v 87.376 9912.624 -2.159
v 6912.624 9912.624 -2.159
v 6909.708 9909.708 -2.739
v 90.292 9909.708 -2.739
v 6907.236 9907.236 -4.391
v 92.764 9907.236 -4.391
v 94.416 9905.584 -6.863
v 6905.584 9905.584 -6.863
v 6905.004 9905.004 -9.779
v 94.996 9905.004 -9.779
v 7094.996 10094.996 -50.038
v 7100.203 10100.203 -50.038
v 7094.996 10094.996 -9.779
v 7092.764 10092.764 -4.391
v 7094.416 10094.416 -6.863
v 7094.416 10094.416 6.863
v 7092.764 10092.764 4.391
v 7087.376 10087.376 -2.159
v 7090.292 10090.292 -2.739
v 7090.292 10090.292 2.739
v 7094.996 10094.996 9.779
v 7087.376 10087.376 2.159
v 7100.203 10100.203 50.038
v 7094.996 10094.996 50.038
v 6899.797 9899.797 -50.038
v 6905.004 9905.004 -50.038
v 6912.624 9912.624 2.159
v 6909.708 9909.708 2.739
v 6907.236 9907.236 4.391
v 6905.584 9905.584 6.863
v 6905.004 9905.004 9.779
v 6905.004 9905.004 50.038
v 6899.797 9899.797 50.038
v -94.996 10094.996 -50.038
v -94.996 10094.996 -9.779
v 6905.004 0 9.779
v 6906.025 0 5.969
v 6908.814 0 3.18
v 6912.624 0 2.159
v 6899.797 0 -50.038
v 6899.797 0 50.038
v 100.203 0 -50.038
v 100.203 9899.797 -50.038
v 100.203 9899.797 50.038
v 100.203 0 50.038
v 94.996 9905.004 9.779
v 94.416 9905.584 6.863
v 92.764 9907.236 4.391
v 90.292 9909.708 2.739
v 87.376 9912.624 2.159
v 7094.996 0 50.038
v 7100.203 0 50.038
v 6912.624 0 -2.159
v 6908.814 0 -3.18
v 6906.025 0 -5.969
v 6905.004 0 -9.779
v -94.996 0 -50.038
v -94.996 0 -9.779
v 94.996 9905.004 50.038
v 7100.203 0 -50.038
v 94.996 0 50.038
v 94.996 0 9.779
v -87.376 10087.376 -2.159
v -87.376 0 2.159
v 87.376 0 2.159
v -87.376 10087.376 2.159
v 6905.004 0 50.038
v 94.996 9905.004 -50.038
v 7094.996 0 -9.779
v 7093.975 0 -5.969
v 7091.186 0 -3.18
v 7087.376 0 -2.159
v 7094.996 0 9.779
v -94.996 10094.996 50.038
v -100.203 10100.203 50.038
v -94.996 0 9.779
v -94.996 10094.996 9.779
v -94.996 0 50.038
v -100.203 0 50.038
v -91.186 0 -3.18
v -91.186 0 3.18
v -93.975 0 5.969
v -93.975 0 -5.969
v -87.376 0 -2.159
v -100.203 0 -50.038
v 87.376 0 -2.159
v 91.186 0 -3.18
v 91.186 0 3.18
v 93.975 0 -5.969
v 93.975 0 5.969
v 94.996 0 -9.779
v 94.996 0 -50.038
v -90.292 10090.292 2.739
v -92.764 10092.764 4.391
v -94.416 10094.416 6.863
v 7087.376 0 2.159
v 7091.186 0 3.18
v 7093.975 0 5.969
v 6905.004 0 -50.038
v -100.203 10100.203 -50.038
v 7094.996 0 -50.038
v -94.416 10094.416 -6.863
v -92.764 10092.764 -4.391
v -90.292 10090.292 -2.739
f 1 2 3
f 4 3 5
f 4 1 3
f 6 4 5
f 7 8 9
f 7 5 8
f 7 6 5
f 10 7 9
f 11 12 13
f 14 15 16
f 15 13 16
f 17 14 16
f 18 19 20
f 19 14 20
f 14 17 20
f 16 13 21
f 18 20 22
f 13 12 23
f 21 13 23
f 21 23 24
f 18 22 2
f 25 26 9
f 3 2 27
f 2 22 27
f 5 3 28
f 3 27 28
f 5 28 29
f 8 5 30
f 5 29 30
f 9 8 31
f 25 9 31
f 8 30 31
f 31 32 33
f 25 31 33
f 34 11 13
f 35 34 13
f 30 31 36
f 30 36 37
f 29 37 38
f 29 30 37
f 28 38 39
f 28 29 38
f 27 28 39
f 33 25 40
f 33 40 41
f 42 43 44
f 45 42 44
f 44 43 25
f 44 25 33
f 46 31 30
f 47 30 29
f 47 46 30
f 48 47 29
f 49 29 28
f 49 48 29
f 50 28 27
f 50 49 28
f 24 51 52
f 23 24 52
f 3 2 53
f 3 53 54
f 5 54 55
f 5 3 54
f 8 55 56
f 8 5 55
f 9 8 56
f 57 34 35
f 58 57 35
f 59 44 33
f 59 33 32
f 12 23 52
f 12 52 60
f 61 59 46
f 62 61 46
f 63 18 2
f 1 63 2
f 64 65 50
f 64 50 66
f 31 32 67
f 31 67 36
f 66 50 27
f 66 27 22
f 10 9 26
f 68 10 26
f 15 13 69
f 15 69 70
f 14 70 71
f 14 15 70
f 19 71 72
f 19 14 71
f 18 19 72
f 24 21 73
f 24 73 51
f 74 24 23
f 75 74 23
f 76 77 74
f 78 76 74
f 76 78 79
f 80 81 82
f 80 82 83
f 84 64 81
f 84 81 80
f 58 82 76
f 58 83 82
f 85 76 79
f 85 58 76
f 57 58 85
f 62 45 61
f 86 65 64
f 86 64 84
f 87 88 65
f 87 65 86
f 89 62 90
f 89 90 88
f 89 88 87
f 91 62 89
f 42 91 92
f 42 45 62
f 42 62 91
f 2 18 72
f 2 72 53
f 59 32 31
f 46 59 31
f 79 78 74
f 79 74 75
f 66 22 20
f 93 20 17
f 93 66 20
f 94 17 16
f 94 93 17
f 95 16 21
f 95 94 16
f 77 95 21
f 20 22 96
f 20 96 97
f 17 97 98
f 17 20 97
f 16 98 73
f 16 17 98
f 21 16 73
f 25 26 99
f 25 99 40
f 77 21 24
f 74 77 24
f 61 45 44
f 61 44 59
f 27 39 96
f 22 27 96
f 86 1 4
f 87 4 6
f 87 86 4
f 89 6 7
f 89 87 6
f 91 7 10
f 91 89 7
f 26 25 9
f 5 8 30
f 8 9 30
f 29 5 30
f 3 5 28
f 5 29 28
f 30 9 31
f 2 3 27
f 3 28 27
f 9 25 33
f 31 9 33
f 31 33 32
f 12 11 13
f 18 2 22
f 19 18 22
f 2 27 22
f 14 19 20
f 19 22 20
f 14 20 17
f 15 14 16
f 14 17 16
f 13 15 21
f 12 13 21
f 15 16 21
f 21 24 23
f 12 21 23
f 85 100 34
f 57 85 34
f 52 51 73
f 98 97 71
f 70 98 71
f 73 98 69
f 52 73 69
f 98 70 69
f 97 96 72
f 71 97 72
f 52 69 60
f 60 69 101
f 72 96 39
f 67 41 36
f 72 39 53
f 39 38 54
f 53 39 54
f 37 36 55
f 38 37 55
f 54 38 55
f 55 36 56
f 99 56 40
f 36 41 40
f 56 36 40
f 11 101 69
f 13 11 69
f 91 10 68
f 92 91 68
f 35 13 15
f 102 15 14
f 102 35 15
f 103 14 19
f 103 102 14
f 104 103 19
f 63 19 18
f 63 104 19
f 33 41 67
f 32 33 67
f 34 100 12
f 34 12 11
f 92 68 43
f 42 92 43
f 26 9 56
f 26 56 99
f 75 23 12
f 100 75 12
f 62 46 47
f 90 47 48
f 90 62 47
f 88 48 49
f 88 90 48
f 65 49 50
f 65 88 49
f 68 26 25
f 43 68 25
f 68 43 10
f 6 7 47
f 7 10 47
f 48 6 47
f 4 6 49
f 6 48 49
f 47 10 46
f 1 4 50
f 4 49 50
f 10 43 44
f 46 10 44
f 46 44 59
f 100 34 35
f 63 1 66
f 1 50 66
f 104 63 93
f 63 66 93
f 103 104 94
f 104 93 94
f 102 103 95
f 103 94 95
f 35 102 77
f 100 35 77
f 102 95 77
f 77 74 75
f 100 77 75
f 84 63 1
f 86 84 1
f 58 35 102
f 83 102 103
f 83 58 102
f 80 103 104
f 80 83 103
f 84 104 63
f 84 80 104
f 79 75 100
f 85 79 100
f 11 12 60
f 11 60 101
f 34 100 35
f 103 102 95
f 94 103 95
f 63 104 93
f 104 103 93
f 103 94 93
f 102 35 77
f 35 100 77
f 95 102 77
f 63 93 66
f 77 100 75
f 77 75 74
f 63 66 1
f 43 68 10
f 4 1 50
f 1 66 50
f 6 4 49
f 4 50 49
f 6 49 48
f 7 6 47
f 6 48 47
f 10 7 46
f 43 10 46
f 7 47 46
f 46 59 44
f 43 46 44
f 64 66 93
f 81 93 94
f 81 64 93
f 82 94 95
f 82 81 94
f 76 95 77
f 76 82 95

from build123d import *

# Parameters (mm, degrees)
W_SECTION_W8X10_1_DEPTH   = 10113.001976112
W_SECTION_W8X10_1_2_DEPTH = 7226.003952224
W_SECTION_W8X10_1_3_DEPTH = 10113.001976113


with BuildPart() as part:
    # Sketch11 → W section W8X10(1) (new body)
    with BuildSketch(Plane.ZX):
        with BuildLine():
            Line((-50.038, -100.203), (-50.038, -94.996))
            Line((-50.038, -94.996), (-9.779, -94.996))
            ThreePointArc((-9.779, -94.996), (-4.390846327, -92.764153673), (-2.159, -87.376))
            Line((-2.159, -87.376), (-2.159, 87.376))
            ThreePointArc((-2.159, 87.376), (-4.390846327, 92.764153673), (-9.779, 94.996))
            Line((-9.779, 94.996), (-50.038, 94.996))
            Line((-50.038, 94.996), (-50.038, 100.203))
            Line((-50.038, 100.203), (50.038, 100.203))
            Line((50.038, 100.203), (50.038, 94.996))
            Line((50.038, 94.996), (9.779, 94.996))
            ThreePointArc((9.779, 94.996), (4.390846327, 92.764153673), (2.159, 87.376))
            Line((2.159, 87.376), (2.159, -87.376))
            ThreePointArc((2.159, -87.376), (4.390846327, -92.764153673), (9.779, -94.996))
            Line((9.779, -94.996), (50.038, -94.996))
            Line((50.038, -94.996), (50.038, -100.203))
            Line((50.038, -100.203), (-50.038, -100.203))
        make_face()
    extrude(amount=W_SECTION_W8X10_1_DEPTH)

    # W section W8X10(1) mitre 1
    split(bisect_by=Plane(origin=(0, 10000, 0), x_dir=(0.707106781, -0.707106781, 0), z_dir=(-0.707106781, -0.707106781, 0)), keep=Keep.TOP)


with BuildPart() as body_2:
    # Sketch11 on segment 2 (carried to segment 2) → W section W8X10_1 2 (new body)
    with BuildSketch(Plane(origin=(-113.001976112, 10000, 0), x_dir=(0, 0, 1), z_dir=(1, 0, 0))):
        with BuildLine():
            Line((-50.038, -100.203), (-50.038, -94.996))
            Line((-50.038, -94.996), (-9.779, -94.996))
            ThreePointArc((-9.779, -94.996), (-4.390846327, -92.764153673), (-2.159, -87.376))
            Line((-2.159, -87.376), (-2.159, 87.376))
            ThreePointArc((-2.159, 87.376), (-4.390846327, 92.764153673), (-9.779, 94.996))
            Line((-9.779, 94.996), (-50.038, 94.996))
            Line((-50.038, 94.996), (-50.038, 100.203))
            Line((-50.038, 100.203), (50.038, 100.203))
            Line((50.038, 100.203), (50.038, 94.996))
            Line((50.038, 94.996), (9.779, 94.996))
            ThreePointArc((9.779, 94.996), (4.390846327, 92.764153673), (2.159, 87.376))
            Line((2.159, 87.376), (2.159, -87.376))
            ThreePointArc((2.159, -87.376), (4.390846327, -92.764153673), (9.779, -94.996))
            Line((9.779, -94.996), (50.038, -94.996))
            Line((50.038, -94.996), (50.038, -100.203))
            Line((50.038, -100.203), (-50.038, -100.203))
        make_face()
    extrude(amount=W_SECTION_W8X10_1_2_DEPTH)

    # W section W8X10_1 2 mitre 1
    split(bisect_by=Plane(origin=(0, 10000, 0), x_dir=(-0.707106781, 0.707106781, 0), z_dir=(0.707106781, 0.707106781, 0)), keep=Keep.TOP)

    # W section W8X10_1 2 mitre 2
    split(bisect_by=Plane(origin=(7000, 10000, 0), x_dir=(-0.707106781, -0.707106781, 0), z_dir=(-0.707106781, 0.707106781, 0)), keep=Keep.TOP)


with BuildPart() as body_3:
    # Sketch11 on segment 3 (carried to segment 3) → W section W8X10_1 3 (new body)
    with BuildSketch(Plane(origin=(7000, 10113.001976112, 0), x_dir=(0, 0, 1), z_dir=(0, -1, 0))):
        with BuildLine():
            Line((-50.038, -100.203), (-50.038, -94.996))
            Line((-50.038, -94.996), (-9.779, -94.996))
            ThreePointArc((-9.779, -94.996), (-4.390846327, -92.764153673), (-2.159, -87.376))
            Line((-2.159, -87.376), (-2.159, 87.376))
            ThreePointArc((-2.159, 87.376), (-4.390846327, 92.764153673), (-9.779, 94.996))
            Line((-9.779, 94.996), (-50.038, 94.996))
            Line((-50.038, 94.996), (-50.038, 100.203))
            Line((-50.038, 100.203), (50.038, 100.203))
            Line((50.038, 100.203), (50.038, 94.996))
            Line((50.038, 94.996), (9.779, 94.996))
            ThreePointArc((9.779, 94.996), (4.390846327, 92.764153673), (2.159, 87.376))
            Line((2.159, 87.376), (2.159, -87.376))
            ThreePointArc((2.159, -87.376), (4.390846327, -92.764153673), (9.779, -94.996))
            Line((9.779, -94.996), (50.038, -94.996))
            Line((50.038, -94.996), (50.038, -100.203))
            Line((50.038, -100.203), (-50.038, -100.203))
        make_face()
    extrude(amount=W_SECTION_W8X10_1_3_DEPTH)

    # W section W8X10_1 3 mitre 1
    split(bisect_by=Plane(origin=(7000, 10000, 0), x_dir=(0.707106781, 0.707106781, 0), z_dir=(0.707106781, -0.707106781, 0)), keep=Keep.TOP)


solid = Compound([part.part, body_2.part, body_3.part])
